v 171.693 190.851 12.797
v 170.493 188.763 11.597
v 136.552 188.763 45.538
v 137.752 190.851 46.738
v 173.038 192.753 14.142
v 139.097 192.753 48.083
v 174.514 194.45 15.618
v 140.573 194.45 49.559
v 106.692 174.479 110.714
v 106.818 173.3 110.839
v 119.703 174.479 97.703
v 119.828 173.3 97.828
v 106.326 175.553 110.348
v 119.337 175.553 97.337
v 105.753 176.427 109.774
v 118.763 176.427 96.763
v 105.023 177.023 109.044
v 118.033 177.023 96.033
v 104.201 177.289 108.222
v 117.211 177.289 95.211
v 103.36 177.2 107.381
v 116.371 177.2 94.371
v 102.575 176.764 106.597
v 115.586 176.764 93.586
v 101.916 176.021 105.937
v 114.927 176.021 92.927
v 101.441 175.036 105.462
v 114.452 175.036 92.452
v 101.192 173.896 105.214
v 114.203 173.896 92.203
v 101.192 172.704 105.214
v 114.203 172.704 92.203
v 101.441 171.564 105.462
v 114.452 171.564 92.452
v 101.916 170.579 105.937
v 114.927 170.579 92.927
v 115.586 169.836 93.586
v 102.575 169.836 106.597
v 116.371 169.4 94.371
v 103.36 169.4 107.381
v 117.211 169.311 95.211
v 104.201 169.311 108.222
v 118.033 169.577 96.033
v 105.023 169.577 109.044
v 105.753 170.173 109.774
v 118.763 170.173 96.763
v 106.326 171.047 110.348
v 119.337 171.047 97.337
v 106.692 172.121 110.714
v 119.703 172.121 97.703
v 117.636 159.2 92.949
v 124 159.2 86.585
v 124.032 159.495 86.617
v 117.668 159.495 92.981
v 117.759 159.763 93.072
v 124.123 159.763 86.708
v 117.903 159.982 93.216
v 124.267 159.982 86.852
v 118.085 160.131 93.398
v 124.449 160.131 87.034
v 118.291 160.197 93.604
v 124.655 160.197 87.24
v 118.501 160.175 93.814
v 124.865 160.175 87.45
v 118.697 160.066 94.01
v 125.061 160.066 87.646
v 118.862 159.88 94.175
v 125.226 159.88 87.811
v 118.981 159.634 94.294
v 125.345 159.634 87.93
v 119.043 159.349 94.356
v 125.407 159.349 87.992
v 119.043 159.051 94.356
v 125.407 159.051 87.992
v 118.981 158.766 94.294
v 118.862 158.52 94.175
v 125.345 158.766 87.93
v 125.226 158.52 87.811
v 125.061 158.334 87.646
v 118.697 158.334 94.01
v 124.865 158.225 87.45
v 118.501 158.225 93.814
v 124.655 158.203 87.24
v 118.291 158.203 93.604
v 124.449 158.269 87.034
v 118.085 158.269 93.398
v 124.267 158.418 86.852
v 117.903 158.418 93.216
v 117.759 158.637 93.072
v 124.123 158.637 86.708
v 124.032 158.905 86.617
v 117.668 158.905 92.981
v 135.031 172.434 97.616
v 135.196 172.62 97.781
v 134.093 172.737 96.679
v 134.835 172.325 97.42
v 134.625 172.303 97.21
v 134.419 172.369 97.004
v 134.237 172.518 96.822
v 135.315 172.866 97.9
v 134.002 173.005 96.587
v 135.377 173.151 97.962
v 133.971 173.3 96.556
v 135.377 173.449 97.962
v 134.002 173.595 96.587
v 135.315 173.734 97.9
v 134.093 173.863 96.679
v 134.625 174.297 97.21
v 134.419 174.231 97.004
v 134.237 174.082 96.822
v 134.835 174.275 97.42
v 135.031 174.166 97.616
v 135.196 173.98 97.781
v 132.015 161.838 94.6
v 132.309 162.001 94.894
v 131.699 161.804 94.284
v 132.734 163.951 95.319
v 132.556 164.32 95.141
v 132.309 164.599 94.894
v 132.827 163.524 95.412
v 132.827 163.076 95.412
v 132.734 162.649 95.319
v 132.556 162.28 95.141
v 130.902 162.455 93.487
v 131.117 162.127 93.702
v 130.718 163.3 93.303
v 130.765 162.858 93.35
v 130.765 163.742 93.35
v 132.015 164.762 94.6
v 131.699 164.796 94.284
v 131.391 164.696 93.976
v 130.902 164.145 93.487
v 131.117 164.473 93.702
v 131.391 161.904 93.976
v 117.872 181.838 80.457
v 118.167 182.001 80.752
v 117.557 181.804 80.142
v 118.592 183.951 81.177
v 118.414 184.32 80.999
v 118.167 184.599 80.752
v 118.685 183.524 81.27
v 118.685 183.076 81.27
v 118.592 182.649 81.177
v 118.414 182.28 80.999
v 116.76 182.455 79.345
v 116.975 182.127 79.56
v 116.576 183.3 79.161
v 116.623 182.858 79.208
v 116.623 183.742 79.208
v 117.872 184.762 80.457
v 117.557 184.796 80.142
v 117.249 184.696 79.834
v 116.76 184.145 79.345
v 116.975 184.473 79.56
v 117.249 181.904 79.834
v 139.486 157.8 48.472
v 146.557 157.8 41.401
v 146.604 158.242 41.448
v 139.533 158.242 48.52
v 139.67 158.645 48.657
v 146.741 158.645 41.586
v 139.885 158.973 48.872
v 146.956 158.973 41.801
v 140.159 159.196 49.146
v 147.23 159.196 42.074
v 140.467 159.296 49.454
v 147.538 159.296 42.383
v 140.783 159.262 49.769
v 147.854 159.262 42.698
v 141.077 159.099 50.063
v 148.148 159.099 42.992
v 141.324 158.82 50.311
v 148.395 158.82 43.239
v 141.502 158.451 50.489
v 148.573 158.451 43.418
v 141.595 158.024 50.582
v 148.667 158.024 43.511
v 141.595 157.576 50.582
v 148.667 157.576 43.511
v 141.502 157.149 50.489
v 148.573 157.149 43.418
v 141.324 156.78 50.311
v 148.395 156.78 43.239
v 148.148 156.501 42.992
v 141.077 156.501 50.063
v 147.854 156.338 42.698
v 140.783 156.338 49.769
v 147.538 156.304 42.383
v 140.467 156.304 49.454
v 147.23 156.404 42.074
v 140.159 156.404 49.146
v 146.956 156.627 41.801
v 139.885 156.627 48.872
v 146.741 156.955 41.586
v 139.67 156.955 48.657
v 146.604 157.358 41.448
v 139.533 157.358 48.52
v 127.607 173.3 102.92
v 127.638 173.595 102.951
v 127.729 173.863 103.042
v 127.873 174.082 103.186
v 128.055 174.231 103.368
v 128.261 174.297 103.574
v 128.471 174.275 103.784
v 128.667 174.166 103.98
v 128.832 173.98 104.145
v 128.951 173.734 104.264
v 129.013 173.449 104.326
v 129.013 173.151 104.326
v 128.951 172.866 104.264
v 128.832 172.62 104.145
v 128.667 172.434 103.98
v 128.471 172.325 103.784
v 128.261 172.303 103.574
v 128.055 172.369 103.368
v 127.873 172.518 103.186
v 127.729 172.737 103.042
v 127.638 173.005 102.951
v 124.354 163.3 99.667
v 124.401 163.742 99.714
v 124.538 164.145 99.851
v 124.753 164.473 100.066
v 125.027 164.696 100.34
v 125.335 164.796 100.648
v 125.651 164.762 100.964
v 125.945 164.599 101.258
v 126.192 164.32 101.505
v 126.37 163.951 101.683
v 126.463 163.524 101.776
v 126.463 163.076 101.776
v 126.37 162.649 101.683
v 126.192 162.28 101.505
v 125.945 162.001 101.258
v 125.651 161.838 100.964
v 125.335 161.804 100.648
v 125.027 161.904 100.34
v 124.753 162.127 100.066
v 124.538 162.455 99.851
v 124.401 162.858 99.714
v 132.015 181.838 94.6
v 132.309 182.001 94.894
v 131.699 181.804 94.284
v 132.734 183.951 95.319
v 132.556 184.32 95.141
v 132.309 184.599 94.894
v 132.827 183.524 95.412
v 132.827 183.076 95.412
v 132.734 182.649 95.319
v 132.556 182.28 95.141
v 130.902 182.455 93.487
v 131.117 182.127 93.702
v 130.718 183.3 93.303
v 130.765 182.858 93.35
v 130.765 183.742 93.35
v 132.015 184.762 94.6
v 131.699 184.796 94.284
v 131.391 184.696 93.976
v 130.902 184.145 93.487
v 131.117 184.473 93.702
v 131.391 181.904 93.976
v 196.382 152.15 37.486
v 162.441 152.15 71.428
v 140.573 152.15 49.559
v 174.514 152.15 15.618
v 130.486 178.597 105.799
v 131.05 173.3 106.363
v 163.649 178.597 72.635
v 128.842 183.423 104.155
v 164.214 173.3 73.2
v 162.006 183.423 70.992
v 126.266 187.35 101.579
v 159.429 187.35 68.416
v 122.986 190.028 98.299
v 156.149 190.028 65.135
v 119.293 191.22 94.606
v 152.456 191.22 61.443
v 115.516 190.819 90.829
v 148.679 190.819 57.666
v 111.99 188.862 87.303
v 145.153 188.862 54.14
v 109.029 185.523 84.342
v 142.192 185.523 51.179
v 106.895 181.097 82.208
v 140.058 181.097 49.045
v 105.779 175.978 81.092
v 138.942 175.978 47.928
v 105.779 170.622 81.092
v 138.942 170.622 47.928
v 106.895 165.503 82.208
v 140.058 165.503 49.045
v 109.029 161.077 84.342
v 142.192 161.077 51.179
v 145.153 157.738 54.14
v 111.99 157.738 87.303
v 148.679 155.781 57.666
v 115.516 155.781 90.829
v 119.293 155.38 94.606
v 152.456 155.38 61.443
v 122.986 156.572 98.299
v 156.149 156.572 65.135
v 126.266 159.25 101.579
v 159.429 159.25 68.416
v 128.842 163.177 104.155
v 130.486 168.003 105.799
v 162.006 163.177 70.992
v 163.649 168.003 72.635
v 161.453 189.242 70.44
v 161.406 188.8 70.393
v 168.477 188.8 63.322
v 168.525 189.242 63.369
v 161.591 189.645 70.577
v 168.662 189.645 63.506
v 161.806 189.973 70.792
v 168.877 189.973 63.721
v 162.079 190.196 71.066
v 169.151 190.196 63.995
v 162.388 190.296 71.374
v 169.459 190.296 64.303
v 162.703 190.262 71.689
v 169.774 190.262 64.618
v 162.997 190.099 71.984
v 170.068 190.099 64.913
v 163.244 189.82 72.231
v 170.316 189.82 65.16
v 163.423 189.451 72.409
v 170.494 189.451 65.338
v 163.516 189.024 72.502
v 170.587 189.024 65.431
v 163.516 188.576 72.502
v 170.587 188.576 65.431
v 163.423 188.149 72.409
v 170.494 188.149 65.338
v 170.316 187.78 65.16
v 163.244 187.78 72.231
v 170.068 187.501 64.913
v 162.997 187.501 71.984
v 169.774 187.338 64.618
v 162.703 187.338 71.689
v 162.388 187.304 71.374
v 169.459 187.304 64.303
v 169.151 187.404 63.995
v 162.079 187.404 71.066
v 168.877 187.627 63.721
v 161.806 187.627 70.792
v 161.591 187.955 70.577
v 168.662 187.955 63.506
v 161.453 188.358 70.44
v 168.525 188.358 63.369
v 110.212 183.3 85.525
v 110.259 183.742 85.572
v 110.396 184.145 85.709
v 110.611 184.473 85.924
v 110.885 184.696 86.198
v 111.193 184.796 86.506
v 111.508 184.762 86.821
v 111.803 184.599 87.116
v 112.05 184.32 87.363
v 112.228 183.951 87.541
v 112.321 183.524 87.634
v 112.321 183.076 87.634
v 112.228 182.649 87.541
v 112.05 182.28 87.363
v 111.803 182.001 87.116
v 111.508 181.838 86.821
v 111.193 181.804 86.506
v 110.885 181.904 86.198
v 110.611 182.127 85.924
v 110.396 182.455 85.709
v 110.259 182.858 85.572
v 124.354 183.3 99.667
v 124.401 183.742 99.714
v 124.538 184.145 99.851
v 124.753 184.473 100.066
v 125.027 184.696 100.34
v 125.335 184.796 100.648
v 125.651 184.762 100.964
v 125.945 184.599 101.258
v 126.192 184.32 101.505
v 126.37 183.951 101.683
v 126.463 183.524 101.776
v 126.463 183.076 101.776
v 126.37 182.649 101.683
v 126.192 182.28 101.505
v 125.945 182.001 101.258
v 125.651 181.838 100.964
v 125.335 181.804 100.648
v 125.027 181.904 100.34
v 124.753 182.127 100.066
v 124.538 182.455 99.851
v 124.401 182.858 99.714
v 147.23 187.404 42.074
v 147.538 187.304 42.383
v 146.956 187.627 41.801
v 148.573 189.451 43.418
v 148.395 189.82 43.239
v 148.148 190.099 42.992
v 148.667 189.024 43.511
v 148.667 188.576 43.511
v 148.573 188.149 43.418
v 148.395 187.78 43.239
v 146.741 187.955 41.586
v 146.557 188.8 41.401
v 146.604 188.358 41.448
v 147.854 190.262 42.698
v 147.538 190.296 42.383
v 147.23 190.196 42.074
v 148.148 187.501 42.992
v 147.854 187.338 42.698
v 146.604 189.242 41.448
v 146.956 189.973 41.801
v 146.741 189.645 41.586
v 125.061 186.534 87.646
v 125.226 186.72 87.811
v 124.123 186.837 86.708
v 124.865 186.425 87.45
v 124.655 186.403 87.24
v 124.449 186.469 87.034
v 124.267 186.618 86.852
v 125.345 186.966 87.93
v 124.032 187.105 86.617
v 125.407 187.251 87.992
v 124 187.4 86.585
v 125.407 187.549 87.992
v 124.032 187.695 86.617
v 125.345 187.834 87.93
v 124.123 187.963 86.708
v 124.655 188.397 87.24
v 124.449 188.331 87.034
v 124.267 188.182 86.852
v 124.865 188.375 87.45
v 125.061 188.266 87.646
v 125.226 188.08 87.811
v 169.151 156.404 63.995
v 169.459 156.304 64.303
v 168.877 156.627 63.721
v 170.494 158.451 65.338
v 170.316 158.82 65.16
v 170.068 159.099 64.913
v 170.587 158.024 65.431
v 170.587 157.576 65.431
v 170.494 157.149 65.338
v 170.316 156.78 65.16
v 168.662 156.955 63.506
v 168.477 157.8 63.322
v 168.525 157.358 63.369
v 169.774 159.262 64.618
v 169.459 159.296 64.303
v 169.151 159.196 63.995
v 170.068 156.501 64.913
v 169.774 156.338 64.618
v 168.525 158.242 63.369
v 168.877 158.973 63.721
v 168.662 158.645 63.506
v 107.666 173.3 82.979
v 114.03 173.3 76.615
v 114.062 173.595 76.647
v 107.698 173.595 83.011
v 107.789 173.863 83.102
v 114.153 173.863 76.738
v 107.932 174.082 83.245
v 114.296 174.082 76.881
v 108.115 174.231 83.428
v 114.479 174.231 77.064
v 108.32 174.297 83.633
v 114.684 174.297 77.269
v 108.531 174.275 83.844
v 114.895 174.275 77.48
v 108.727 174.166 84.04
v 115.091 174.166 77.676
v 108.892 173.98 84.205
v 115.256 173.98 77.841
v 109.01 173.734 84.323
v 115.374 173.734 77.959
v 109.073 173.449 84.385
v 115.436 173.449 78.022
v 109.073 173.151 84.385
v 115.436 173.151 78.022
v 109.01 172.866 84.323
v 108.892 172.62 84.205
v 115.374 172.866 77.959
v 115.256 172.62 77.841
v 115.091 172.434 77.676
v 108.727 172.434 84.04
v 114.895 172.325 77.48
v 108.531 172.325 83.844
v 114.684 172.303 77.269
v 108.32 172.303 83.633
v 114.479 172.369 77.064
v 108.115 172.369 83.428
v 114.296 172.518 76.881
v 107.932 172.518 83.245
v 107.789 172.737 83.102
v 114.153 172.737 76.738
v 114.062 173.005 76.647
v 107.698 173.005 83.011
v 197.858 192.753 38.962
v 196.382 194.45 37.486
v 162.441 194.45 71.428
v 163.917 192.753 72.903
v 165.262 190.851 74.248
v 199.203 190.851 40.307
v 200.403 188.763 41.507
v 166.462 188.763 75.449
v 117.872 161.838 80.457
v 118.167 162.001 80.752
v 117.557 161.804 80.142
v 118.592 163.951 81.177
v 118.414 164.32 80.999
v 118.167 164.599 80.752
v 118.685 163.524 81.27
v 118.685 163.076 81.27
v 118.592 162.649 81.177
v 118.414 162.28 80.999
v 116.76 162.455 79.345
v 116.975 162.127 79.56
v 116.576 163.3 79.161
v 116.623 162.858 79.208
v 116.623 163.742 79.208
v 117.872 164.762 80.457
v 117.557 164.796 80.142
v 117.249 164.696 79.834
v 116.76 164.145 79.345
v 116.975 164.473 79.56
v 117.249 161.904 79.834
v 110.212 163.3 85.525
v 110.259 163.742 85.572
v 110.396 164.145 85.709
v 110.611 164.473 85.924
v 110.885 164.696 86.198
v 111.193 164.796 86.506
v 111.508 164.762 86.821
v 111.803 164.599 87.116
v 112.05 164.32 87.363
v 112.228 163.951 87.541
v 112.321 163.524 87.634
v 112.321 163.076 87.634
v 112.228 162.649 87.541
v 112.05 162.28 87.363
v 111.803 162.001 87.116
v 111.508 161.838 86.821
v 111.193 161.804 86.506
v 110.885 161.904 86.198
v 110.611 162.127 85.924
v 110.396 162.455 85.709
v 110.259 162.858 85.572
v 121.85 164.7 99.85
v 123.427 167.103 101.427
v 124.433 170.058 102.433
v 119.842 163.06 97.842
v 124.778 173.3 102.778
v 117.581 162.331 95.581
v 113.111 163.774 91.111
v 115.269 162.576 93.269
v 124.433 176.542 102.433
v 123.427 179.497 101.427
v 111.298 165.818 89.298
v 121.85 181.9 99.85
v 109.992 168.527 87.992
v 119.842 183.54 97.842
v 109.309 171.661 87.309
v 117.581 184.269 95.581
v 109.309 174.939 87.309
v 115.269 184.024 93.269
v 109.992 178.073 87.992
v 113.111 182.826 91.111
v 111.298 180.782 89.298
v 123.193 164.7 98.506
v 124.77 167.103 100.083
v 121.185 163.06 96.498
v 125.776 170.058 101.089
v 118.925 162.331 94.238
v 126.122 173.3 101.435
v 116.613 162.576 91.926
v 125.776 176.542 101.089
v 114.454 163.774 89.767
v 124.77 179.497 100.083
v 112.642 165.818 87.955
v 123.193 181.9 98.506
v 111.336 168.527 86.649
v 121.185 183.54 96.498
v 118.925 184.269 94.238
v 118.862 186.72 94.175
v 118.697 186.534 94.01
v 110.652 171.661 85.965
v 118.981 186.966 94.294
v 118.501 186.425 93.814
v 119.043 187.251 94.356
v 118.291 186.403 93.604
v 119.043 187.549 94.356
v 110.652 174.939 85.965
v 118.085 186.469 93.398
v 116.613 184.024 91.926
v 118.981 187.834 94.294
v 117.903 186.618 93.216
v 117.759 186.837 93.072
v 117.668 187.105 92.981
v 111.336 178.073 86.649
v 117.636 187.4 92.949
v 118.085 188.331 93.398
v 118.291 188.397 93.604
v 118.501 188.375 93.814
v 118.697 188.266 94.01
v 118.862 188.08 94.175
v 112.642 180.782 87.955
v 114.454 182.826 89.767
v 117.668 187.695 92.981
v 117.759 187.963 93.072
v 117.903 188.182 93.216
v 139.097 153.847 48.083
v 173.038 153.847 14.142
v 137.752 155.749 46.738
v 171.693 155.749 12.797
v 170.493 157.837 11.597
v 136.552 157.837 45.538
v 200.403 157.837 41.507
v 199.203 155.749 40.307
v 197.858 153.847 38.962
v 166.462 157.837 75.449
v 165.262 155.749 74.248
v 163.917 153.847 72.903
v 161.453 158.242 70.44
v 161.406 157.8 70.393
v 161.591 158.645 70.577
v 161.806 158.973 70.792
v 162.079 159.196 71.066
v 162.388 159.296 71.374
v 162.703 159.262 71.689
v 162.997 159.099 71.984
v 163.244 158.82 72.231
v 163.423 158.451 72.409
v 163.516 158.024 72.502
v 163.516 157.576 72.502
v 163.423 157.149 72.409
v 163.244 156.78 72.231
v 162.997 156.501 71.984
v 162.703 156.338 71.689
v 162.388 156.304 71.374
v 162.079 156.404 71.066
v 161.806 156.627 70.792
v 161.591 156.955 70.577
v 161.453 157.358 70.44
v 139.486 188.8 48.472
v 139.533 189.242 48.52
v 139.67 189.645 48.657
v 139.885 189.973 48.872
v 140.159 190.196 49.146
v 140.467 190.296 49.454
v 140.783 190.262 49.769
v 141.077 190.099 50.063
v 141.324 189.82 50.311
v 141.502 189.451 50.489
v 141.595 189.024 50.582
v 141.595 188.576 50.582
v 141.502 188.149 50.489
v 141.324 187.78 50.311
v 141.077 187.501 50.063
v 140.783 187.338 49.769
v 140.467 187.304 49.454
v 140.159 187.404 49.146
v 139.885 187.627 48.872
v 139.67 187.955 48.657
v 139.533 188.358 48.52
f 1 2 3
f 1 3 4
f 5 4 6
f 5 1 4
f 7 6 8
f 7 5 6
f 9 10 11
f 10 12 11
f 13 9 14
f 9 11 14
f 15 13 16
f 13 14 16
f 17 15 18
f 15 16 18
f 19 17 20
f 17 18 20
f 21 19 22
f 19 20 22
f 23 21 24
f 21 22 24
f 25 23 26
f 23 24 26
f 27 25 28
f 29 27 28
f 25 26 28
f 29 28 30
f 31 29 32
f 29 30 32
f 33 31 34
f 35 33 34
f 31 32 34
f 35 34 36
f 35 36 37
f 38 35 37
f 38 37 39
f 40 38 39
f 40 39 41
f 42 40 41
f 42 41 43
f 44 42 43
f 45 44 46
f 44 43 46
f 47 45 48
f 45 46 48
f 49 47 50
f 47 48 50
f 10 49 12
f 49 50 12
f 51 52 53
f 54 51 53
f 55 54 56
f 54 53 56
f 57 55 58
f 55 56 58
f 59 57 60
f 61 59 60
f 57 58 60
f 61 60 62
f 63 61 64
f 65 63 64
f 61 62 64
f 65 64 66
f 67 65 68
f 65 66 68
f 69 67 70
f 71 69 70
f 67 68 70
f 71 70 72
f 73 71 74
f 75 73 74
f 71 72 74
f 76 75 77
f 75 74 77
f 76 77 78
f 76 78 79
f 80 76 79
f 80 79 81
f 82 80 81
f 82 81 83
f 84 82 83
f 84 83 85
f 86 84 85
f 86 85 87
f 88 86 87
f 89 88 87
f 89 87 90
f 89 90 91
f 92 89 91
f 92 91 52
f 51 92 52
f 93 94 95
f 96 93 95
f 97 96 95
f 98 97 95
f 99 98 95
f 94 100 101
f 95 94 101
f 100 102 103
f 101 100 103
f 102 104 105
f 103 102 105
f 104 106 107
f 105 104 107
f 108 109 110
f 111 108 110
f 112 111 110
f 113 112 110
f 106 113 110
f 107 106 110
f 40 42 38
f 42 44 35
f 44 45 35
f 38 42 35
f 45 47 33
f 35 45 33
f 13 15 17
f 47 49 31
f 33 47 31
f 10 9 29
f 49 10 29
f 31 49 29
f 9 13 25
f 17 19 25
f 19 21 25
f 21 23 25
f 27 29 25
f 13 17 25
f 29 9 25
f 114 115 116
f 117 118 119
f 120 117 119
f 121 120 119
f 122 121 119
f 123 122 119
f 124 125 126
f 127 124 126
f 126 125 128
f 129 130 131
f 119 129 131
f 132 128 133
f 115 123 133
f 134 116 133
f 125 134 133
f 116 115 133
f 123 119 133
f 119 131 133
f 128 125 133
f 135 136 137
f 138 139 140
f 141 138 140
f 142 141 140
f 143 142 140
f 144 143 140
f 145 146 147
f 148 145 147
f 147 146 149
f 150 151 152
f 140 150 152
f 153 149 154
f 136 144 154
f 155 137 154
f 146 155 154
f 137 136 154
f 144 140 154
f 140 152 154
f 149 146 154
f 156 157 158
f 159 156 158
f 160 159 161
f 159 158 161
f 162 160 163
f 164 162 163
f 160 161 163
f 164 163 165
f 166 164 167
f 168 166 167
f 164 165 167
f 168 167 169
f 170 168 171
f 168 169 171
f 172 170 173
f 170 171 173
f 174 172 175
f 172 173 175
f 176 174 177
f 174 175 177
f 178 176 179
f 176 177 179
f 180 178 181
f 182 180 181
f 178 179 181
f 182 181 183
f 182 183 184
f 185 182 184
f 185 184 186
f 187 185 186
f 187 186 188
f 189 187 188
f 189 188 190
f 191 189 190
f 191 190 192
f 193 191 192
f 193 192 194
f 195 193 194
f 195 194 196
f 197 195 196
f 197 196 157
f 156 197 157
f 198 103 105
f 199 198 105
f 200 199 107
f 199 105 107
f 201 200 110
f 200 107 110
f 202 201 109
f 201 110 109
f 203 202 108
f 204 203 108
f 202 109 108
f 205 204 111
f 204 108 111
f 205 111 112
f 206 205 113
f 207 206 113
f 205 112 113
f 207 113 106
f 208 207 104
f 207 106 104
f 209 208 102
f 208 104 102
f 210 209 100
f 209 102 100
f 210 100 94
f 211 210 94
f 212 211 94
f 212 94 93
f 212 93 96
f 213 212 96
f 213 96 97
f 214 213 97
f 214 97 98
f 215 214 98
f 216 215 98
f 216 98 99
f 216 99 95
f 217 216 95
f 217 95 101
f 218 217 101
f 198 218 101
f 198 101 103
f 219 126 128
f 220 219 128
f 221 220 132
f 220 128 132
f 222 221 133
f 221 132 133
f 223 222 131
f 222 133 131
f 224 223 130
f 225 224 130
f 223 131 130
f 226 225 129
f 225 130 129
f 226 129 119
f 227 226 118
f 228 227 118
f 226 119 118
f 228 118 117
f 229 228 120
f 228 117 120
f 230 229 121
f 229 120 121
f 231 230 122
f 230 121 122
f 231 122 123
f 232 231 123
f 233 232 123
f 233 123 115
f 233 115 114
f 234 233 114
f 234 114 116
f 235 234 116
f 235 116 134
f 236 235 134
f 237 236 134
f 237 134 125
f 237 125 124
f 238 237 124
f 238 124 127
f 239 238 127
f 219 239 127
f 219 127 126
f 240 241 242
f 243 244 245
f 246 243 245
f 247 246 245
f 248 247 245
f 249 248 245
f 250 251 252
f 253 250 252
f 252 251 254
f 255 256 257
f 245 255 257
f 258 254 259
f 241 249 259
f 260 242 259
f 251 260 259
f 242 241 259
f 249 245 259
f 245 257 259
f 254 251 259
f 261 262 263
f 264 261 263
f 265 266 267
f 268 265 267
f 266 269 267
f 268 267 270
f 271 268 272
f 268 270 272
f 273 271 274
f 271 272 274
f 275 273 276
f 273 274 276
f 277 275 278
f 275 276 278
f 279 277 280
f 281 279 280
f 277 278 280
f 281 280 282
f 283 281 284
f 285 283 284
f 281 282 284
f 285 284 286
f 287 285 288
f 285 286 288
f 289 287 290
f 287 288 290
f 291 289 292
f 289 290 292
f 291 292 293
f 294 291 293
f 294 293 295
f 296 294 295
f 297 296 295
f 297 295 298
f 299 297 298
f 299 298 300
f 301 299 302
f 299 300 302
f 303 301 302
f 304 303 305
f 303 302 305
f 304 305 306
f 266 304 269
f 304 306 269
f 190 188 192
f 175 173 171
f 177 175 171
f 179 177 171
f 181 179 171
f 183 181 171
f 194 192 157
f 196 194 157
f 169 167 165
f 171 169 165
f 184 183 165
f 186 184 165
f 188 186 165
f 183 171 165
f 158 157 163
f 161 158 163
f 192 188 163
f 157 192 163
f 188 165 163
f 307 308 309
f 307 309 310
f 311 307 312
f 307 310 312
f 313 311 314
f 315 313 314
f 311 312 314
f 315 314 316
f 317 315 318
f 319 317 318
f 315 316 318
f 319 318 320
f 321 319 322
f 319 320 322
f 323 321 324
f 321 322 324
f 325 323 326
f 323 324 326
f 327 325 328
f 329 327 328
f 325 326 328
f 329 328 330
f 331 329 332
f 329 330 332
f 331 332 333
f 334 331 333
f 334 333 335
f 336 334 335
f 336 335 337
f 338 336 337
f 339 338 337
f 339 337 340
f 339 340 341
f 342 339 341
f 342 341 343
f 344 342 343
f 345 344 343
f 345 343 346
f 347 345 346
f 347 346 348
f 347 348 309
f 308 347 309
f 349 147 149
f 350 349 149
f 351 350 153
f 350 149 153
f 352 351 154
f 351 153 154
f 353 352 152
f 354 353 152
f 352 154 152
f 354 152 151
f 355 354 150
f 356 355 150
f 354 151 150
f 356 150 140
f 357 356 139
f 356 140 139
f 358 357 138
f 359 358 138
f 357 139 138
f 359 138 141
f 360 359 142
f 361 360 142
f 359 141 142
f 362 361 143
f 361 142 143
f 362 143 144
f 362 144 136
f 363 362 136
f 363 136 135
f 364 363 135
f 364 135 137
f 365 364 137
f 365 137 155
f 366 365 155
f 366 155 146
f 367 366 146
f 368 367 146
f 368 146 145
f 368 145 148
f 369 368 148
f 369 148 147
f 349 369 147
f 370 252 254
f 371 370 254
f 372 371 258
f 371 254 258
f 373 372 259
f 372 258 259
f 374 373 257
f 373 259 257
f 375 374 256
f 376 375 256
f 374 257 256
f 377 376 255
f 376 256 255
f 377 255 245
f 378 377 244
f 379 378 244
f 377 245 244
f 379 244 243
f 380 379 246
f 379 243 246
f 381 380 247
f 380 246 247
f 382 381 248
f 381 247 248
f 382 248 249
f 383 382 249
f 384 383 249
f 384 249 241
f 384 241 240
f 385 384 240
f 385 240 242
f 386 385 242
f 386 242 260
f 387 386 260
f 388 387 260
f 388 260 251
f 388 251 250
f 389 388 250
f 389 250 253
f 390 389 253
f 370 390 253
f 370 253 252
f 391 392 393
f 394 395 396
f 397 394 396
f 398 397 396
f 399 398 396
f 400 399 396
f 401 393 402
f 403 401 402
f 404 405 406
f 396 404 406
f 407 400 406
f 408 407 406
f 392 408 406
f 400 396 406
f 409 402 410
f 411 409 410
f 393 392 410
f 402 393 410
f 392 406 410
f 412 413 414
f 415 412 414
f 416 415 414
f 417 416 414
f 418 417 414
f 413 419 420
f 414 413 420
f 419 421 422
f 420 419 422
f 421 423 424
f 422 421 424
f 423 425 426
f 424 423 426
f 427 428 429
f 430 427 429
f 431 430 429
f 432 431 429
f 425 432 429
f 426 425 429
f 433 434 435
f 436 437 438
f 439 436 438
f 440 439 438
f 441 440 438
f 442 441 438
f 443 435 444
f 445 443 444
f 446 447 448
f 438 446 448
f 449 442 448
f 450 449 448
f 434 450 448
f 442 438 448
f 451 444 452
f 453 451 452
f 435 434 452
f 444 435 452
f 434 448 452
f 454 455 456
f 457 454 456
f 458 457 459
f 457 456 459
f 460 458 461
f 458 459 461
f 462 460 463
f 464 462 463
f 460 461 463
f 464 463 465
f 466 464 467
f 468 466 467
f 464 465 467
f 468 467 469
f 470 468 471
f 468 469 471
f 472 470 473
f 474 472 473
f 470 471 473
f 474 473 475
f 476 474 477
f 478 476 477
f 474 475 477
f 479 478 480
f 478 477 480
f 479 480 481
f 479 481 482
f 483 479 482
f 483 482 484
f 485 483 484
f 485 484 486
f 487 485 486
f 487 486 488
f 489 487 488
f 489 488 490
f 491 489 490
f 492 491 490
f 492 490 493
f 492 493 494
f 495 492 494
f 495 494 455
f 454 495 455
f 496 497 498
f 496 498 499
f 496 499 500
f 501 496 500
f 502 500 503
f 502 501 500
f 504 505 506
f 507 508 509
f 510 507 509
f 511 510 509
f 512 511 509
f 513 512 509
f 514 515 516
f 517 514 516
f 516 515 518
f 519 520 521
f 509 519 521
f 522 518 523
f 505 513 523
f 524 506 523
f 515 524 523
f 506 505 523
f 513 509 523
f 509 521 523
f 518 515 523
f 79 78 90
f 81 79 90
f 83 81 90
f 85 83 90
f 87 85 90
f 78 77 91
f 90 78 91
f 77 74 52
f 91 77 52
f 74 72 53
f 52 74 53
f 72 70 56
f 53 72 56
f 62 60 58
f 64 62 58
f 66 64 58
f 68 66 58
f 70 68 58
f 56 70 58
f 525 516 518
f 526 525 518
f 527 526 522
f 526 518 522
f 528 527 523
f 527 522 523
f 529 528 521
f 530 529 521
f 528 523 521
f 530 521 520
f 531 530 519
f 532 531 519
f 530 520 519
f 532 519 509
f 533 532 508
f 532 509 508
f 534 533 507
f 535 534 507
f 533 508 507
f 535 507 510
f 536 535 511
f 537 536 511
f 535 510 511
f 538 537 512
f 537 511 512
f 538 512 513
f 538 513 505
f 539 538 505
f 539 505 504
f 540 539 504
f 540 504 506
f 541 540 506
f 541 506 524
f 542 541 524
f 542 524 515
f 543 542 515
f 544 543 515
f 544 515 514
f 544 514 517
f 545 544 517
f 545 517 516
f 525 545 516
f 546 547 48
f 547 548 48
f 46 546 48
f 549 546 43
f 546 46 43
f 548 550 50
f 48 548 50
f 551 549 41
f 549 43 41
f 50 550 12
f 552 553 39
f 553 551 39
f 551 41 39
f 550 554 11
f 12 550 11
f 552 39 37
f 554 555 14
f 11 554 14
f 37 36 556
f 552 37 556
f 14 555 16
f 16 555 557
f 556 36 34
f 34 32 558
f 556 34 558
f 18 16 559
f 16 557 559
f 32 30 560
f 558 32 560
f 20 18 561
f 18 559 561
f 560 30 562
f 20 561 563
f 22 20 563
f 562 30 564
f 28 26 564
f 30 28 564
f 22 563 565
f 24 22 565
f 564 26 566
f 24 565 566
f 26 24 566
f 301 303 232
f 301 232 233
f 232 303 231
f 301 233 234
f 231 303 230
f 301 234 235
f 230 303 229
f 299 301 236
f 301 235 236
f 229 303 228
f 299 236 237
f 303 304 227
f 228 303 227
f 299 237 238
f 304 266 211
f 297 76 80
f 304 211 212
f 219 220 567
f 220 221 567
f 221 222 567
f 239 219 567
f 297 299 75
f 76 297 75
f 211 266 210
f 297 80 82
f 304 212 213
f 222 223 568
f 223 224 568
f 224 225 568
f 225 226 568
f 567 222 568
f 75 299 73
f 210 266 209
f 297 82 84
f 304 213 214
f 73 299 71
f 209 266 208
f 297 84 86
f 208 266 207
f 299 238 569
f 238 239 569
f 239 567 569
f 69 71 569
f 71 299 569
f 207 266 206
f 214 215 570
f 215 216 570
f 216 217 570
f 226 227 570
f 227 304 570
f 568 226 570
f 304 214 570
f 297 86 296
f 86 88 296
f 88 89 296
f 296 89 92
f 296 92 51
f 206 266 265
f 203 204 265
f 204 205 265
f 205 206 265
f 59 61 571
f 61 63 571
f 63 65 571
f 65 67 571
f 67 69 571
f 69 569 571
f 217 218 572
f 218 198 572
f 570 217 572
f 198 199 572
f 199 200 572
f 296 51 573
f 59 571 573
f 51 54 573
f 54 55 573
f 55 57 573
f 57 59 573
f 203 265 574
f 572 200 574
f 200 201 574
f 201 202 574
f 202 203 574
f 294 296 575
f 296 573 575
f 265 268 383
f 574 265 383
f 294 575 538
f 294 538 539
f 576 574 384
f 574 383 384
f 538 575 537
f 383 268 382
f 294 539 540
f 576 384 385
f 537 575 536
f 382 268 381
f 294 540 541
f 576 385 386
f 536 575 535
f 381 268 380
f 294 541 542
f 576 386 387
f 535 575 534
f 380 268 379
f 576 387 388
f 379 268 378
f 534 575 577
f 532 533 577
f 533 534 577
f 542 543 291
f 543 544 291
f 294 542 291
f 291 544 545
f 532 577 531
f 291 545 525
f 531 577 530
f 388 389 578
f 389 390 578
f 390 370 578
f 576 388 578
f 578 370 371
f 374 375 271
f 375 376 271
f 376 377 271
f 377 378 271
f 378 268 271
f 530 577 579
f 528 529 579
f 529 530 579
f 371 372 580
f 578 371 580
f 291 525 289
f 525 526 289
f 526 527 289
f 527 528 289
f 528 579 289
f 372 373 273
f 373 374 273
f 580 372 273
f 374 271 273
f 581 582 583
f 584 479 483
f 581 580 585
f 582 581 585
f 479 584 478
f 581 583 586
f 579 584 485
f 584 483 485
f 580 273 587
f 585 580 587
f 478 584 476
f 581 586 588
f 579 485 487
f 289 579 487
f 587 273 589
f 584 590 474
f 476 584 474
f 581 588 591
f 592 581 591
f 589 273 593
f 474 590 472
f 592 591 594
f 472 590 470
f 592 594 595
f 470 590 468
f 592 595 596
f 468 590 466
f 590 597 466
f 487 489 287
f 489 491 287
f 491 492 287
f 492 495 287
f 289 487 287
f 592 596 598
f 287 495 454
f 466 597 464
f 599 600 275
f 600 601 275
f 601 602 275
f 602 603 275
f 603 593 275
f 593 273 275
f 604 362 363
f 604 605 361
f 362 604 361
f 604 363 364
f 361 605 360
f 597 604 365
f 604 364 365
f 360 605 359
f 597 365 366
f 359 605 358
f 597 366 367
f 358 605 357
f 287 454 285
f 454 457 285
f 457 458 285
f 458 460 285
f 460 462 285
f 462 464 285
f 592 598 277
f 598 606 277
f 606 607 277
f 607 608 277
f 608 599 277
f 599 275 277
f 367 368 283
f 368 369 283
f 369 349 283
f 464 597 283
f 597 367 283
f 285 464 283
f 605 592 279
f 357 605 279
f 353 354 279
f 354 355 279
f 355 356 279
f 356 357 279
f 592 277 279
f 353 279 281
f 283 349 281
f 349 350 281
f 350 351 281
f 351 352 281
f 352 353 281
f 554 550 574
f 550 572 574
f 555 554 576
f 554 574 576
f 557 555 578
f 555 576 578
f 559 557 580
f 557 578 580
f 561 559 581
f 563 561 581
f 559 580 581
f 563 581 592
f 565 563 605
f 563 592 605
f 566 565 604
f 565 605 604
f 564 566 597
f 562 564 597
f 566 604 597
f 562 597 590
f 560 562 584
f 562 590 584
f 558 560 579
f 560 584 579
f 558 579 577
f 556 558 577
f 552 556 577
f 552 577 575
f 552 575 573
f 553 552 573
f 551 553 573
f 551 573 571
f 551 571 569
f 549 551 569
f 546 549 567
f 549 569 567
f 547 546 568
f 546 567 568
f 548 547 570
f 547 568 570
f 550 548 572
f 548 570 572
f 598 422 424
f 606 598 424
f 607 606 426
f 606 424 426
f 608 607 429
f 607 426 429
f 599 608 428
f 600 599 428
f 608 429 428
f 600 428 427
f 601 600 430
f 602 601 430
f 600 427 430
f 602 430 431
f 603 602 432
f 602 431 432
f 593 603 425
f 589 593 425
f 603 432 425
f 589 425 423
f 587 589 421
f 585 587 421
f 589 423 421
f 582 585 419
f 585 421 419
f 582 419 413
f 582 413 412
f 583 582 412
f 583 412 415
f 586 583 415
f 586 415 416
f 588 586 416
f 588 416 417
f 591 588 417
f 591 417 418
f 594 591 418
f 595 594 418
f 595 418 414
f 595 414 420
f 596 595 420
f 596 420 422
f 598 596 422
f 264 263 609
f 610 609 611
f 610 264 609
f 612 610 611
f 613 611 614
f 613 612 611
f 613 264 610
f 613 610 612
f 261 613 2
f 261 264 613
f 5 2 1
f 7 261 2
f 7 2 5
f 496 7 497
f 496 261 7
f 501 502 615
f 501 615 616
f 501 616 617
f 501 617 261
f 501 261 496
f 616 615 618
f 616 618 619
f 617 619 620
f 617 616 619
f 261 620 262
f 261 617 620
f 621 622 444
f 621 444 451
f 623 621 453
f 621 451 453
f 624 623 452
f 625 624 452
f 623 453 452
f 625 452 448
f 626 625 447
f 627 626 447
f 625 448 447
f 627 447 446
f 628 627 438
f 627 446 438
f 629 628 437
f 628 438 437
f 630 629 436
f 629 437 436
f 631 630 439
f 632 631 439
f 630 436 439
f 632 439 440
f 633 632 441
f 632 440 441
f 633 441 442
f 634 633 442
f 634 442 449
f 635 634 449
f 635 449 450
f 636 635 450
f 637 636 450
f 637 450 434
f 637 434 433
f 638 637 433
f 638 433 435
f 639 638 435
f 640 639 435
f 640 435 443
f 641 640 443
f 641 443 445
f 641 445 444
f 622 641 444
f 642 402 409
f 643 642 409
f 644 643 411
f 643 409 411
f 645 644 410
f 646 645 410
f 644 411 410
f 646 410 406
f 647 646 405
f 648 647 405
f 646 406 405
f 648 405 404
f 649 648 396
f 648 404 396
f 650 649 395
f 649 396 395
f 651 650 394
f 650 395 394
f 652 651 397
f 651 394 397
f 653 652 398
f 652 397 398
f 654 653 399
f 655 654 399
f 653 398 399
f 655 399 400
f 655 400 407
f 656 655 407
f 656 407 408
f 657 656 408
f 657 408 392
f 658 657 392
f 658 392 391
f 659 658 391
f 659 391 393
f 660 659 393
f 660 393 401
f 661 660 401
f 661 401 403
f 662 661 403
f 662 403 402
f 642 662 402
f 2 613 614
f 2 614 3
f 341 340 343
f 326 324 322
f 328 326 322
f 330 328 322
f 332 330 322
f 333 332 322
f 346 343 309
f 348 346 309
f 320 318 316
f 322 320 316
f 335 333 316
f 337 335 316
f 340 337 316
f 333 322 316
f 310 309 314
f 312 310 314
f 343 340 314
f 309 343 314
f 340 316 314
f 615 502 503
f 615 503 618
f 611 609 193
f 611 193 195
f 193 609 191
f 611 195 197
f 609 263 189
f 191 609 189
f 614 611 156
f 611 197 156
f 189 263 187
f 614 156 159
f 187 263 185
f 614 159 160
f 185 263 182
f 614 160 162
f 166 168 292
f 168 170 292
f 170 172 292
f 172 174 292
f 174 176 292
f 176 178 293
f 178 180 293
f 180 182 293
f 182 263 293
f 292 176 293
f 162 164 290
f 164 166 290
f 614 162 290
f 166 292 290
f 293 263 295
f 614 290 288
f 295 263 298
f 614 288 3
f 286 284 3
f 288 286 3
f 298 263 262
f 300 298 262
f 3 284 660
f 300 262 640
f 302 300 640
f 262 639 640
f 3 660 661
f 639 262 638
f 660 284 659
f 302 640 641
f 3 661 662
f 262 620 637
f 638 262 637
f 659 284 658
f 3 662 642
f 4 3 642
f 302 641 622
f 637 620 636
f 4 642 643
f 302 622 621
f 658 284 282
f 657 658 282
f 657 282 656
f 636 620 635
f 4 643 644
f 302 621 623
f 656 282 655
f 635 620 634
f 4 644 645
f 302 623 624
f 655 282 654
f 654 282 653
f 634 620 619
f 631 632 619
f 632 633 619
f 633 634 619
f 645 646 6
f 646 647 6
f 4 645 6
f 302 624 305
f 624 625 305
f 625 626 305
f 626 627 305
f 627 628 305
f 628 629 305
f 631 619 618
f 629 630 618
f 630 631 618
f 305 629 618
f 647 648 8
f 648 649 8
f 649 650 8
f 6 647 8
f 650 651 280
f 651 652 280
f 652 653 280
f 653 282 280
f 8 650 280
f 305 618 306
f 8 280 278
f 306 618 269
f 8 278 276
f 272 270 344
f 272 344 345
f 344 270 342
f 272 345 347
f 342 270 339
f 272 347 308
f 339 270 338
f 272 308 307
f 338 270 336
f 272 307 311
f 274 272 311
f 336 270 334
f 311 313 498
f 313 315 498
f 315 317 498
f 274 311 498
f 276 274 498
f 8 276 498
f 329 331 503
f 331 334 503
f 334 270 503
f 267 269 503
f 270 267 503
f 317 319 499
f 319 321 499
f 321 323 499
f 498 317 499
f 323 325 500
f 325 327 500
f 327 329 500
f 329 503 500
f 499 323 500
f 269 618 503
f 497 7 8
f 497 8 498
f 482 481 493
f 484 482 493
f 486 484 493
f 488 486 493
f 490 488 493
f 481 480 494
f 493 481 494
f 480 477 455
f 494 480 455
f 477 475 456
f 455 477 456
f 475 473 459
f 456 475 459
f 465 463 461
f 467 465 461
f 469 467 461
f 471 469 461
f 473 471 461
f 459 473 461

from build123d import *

# Parameters (mm, degrees)
BOSS_EXTRU_1_DEPTH                = 48
DIAM_TRE_DU_PER_AGE_3_0_3_1_D     = 3
DIAM_TRE_DU_PER_AGE_3_0_3_1_DEPTH = 10
DIAM_TRE_DU_PER_AGE_2_0_2_1_D     = 2
DIAM_TRE_DU_PER_AGE_2_0_2_1_DEPTH = 9.000001526
DIAM_TRE_DU_PER_AGE_3_0_3_2_D     = 3
DIAM_TRE_DU_PER_AGE_3_0_3_2_DEPTH = 9.000001526


with BuildPart() as part:
    # Esquisse1 → Boss.-Extru.1 (new body)
    with BuildSketch(Plane(origin=(79.448008992, 0, -79.44794681), x_dir=(0, 1, 0), z_dir=(0.7071070579059934, 0, -0.7071065044669933))):
        with BuildLine():
            Line((188.763426925, 171.056630761), (157.836573075, 171.056630761))
            ThreePointArc((157.836573075, 171.056630761), (154.773801793, 168.43282973), (152.150000763, 165.370058448))
            Line((152.150000763, 165.370058448), (152.150000763, 134.443204599))
            ThreePointArc((152.150000763, 134.443204599), (154.77380225, 131.38043286), (157.836574119, 128.756631524))
            Line((157.836574119, 128.756631524), (188.763425881, 128.756631524))
            ThreePointArc((188.763425881, 128.756631524), (191.826198207, 131.380433317), (194.45, 134.443205643))
            Line((194.45, 134.443205643), (194.45, 165.370057405))
            ThreePointArc((194.45, 165.370057405), (191.826198664, 168.432829273), (188.763426925, 171.056630761))
        make_face()
    extrude(amount=-BOSS_EXTRU_1_DEPTH)

    # Esquisse2 → Révolution1 (revolve)
    with BuildSketch(Plane(origin=(0, 173.3, 0), x_dir=(1, 0, 0), z_dir=(0, 1, 0))):
        Polygon((164.213527842, -73.19991591), (151.506824443, -60.493202565), (103.989230421, -108.010759396), (106.817656439, -110.839187627), (119.828426035, -97.828428215), (124.778171566, -102.77817762), (126.12167388, -101.434676357), (131.050205731, -106.363212066), align=None)
    revolve(axis=Axis((132.687188584, 173.3, 79.312823694), (-0.7071070579059953, 0, 0.7071065044669914)))

    # Diamètre du perçage Ø3.0 (3)1
    with Locations(Plane(origin=(45.506870213, 0, -45.506834595), x_dir=(0.7071065044669932, 0, 0.7071070579059936), z_dir=(-0.7071070579059936, 0, 0.7071065044669932))):
        with Locations((134.406631524, 188.8), (134.406631524, 157.8), (165.406631524, 188.8), (165.406631524, 157.8)):
            Hole(DIAM_TRE_DU_PER_AGE_3_0_3_1_D / 2, depth=DIAM_TRE_DU_PER_AGE_3_0_3_1_DEPTH)

    # Diamètre du perçage Ø2.0 (2)1
    with Locations(Plane(origin=(12.343548118, 0, -12.343538457), x_dir=(0.7071065044669916, 0, 0.7071070579059952), z_dir=(-0.7071070579059952, 0, 0.7071065044669916))):
        with Locations((149.906631524, 159.2), (164.006631524, 173.3), (135.806631524, 173.3), (149.906631524, 187.4)):
            Hole(DIAM_TRE_DU_PER_AGE_2_0_2_1_D / 2, depth=DIAM_TRE_DU_PER_AGE_2_0_2_1_DEPTH)

    # Diamètre du perçage Ø3.0 (3)2
    with Locations(Plane(origin=(12.343548118, 0, -12.343538457), x_dir=(0.7071065044669916, 0, 0.7071070579059952), z_dir=(-0.7071070579059952, 0, 0.7071065044669916))):
        with Locations((139.906631524, 163.3), (139.906631524, 183.3), (159.906631524, 183.3), (159.906631524, 163.3)):
            Hole(DIAM_TRE_DU_PER_AGE_3_0_3_2_D / 2, depth=DIAM_TRE_DU_PER_AGE_3_0_3_2_DEPTH)


solid = part.part
